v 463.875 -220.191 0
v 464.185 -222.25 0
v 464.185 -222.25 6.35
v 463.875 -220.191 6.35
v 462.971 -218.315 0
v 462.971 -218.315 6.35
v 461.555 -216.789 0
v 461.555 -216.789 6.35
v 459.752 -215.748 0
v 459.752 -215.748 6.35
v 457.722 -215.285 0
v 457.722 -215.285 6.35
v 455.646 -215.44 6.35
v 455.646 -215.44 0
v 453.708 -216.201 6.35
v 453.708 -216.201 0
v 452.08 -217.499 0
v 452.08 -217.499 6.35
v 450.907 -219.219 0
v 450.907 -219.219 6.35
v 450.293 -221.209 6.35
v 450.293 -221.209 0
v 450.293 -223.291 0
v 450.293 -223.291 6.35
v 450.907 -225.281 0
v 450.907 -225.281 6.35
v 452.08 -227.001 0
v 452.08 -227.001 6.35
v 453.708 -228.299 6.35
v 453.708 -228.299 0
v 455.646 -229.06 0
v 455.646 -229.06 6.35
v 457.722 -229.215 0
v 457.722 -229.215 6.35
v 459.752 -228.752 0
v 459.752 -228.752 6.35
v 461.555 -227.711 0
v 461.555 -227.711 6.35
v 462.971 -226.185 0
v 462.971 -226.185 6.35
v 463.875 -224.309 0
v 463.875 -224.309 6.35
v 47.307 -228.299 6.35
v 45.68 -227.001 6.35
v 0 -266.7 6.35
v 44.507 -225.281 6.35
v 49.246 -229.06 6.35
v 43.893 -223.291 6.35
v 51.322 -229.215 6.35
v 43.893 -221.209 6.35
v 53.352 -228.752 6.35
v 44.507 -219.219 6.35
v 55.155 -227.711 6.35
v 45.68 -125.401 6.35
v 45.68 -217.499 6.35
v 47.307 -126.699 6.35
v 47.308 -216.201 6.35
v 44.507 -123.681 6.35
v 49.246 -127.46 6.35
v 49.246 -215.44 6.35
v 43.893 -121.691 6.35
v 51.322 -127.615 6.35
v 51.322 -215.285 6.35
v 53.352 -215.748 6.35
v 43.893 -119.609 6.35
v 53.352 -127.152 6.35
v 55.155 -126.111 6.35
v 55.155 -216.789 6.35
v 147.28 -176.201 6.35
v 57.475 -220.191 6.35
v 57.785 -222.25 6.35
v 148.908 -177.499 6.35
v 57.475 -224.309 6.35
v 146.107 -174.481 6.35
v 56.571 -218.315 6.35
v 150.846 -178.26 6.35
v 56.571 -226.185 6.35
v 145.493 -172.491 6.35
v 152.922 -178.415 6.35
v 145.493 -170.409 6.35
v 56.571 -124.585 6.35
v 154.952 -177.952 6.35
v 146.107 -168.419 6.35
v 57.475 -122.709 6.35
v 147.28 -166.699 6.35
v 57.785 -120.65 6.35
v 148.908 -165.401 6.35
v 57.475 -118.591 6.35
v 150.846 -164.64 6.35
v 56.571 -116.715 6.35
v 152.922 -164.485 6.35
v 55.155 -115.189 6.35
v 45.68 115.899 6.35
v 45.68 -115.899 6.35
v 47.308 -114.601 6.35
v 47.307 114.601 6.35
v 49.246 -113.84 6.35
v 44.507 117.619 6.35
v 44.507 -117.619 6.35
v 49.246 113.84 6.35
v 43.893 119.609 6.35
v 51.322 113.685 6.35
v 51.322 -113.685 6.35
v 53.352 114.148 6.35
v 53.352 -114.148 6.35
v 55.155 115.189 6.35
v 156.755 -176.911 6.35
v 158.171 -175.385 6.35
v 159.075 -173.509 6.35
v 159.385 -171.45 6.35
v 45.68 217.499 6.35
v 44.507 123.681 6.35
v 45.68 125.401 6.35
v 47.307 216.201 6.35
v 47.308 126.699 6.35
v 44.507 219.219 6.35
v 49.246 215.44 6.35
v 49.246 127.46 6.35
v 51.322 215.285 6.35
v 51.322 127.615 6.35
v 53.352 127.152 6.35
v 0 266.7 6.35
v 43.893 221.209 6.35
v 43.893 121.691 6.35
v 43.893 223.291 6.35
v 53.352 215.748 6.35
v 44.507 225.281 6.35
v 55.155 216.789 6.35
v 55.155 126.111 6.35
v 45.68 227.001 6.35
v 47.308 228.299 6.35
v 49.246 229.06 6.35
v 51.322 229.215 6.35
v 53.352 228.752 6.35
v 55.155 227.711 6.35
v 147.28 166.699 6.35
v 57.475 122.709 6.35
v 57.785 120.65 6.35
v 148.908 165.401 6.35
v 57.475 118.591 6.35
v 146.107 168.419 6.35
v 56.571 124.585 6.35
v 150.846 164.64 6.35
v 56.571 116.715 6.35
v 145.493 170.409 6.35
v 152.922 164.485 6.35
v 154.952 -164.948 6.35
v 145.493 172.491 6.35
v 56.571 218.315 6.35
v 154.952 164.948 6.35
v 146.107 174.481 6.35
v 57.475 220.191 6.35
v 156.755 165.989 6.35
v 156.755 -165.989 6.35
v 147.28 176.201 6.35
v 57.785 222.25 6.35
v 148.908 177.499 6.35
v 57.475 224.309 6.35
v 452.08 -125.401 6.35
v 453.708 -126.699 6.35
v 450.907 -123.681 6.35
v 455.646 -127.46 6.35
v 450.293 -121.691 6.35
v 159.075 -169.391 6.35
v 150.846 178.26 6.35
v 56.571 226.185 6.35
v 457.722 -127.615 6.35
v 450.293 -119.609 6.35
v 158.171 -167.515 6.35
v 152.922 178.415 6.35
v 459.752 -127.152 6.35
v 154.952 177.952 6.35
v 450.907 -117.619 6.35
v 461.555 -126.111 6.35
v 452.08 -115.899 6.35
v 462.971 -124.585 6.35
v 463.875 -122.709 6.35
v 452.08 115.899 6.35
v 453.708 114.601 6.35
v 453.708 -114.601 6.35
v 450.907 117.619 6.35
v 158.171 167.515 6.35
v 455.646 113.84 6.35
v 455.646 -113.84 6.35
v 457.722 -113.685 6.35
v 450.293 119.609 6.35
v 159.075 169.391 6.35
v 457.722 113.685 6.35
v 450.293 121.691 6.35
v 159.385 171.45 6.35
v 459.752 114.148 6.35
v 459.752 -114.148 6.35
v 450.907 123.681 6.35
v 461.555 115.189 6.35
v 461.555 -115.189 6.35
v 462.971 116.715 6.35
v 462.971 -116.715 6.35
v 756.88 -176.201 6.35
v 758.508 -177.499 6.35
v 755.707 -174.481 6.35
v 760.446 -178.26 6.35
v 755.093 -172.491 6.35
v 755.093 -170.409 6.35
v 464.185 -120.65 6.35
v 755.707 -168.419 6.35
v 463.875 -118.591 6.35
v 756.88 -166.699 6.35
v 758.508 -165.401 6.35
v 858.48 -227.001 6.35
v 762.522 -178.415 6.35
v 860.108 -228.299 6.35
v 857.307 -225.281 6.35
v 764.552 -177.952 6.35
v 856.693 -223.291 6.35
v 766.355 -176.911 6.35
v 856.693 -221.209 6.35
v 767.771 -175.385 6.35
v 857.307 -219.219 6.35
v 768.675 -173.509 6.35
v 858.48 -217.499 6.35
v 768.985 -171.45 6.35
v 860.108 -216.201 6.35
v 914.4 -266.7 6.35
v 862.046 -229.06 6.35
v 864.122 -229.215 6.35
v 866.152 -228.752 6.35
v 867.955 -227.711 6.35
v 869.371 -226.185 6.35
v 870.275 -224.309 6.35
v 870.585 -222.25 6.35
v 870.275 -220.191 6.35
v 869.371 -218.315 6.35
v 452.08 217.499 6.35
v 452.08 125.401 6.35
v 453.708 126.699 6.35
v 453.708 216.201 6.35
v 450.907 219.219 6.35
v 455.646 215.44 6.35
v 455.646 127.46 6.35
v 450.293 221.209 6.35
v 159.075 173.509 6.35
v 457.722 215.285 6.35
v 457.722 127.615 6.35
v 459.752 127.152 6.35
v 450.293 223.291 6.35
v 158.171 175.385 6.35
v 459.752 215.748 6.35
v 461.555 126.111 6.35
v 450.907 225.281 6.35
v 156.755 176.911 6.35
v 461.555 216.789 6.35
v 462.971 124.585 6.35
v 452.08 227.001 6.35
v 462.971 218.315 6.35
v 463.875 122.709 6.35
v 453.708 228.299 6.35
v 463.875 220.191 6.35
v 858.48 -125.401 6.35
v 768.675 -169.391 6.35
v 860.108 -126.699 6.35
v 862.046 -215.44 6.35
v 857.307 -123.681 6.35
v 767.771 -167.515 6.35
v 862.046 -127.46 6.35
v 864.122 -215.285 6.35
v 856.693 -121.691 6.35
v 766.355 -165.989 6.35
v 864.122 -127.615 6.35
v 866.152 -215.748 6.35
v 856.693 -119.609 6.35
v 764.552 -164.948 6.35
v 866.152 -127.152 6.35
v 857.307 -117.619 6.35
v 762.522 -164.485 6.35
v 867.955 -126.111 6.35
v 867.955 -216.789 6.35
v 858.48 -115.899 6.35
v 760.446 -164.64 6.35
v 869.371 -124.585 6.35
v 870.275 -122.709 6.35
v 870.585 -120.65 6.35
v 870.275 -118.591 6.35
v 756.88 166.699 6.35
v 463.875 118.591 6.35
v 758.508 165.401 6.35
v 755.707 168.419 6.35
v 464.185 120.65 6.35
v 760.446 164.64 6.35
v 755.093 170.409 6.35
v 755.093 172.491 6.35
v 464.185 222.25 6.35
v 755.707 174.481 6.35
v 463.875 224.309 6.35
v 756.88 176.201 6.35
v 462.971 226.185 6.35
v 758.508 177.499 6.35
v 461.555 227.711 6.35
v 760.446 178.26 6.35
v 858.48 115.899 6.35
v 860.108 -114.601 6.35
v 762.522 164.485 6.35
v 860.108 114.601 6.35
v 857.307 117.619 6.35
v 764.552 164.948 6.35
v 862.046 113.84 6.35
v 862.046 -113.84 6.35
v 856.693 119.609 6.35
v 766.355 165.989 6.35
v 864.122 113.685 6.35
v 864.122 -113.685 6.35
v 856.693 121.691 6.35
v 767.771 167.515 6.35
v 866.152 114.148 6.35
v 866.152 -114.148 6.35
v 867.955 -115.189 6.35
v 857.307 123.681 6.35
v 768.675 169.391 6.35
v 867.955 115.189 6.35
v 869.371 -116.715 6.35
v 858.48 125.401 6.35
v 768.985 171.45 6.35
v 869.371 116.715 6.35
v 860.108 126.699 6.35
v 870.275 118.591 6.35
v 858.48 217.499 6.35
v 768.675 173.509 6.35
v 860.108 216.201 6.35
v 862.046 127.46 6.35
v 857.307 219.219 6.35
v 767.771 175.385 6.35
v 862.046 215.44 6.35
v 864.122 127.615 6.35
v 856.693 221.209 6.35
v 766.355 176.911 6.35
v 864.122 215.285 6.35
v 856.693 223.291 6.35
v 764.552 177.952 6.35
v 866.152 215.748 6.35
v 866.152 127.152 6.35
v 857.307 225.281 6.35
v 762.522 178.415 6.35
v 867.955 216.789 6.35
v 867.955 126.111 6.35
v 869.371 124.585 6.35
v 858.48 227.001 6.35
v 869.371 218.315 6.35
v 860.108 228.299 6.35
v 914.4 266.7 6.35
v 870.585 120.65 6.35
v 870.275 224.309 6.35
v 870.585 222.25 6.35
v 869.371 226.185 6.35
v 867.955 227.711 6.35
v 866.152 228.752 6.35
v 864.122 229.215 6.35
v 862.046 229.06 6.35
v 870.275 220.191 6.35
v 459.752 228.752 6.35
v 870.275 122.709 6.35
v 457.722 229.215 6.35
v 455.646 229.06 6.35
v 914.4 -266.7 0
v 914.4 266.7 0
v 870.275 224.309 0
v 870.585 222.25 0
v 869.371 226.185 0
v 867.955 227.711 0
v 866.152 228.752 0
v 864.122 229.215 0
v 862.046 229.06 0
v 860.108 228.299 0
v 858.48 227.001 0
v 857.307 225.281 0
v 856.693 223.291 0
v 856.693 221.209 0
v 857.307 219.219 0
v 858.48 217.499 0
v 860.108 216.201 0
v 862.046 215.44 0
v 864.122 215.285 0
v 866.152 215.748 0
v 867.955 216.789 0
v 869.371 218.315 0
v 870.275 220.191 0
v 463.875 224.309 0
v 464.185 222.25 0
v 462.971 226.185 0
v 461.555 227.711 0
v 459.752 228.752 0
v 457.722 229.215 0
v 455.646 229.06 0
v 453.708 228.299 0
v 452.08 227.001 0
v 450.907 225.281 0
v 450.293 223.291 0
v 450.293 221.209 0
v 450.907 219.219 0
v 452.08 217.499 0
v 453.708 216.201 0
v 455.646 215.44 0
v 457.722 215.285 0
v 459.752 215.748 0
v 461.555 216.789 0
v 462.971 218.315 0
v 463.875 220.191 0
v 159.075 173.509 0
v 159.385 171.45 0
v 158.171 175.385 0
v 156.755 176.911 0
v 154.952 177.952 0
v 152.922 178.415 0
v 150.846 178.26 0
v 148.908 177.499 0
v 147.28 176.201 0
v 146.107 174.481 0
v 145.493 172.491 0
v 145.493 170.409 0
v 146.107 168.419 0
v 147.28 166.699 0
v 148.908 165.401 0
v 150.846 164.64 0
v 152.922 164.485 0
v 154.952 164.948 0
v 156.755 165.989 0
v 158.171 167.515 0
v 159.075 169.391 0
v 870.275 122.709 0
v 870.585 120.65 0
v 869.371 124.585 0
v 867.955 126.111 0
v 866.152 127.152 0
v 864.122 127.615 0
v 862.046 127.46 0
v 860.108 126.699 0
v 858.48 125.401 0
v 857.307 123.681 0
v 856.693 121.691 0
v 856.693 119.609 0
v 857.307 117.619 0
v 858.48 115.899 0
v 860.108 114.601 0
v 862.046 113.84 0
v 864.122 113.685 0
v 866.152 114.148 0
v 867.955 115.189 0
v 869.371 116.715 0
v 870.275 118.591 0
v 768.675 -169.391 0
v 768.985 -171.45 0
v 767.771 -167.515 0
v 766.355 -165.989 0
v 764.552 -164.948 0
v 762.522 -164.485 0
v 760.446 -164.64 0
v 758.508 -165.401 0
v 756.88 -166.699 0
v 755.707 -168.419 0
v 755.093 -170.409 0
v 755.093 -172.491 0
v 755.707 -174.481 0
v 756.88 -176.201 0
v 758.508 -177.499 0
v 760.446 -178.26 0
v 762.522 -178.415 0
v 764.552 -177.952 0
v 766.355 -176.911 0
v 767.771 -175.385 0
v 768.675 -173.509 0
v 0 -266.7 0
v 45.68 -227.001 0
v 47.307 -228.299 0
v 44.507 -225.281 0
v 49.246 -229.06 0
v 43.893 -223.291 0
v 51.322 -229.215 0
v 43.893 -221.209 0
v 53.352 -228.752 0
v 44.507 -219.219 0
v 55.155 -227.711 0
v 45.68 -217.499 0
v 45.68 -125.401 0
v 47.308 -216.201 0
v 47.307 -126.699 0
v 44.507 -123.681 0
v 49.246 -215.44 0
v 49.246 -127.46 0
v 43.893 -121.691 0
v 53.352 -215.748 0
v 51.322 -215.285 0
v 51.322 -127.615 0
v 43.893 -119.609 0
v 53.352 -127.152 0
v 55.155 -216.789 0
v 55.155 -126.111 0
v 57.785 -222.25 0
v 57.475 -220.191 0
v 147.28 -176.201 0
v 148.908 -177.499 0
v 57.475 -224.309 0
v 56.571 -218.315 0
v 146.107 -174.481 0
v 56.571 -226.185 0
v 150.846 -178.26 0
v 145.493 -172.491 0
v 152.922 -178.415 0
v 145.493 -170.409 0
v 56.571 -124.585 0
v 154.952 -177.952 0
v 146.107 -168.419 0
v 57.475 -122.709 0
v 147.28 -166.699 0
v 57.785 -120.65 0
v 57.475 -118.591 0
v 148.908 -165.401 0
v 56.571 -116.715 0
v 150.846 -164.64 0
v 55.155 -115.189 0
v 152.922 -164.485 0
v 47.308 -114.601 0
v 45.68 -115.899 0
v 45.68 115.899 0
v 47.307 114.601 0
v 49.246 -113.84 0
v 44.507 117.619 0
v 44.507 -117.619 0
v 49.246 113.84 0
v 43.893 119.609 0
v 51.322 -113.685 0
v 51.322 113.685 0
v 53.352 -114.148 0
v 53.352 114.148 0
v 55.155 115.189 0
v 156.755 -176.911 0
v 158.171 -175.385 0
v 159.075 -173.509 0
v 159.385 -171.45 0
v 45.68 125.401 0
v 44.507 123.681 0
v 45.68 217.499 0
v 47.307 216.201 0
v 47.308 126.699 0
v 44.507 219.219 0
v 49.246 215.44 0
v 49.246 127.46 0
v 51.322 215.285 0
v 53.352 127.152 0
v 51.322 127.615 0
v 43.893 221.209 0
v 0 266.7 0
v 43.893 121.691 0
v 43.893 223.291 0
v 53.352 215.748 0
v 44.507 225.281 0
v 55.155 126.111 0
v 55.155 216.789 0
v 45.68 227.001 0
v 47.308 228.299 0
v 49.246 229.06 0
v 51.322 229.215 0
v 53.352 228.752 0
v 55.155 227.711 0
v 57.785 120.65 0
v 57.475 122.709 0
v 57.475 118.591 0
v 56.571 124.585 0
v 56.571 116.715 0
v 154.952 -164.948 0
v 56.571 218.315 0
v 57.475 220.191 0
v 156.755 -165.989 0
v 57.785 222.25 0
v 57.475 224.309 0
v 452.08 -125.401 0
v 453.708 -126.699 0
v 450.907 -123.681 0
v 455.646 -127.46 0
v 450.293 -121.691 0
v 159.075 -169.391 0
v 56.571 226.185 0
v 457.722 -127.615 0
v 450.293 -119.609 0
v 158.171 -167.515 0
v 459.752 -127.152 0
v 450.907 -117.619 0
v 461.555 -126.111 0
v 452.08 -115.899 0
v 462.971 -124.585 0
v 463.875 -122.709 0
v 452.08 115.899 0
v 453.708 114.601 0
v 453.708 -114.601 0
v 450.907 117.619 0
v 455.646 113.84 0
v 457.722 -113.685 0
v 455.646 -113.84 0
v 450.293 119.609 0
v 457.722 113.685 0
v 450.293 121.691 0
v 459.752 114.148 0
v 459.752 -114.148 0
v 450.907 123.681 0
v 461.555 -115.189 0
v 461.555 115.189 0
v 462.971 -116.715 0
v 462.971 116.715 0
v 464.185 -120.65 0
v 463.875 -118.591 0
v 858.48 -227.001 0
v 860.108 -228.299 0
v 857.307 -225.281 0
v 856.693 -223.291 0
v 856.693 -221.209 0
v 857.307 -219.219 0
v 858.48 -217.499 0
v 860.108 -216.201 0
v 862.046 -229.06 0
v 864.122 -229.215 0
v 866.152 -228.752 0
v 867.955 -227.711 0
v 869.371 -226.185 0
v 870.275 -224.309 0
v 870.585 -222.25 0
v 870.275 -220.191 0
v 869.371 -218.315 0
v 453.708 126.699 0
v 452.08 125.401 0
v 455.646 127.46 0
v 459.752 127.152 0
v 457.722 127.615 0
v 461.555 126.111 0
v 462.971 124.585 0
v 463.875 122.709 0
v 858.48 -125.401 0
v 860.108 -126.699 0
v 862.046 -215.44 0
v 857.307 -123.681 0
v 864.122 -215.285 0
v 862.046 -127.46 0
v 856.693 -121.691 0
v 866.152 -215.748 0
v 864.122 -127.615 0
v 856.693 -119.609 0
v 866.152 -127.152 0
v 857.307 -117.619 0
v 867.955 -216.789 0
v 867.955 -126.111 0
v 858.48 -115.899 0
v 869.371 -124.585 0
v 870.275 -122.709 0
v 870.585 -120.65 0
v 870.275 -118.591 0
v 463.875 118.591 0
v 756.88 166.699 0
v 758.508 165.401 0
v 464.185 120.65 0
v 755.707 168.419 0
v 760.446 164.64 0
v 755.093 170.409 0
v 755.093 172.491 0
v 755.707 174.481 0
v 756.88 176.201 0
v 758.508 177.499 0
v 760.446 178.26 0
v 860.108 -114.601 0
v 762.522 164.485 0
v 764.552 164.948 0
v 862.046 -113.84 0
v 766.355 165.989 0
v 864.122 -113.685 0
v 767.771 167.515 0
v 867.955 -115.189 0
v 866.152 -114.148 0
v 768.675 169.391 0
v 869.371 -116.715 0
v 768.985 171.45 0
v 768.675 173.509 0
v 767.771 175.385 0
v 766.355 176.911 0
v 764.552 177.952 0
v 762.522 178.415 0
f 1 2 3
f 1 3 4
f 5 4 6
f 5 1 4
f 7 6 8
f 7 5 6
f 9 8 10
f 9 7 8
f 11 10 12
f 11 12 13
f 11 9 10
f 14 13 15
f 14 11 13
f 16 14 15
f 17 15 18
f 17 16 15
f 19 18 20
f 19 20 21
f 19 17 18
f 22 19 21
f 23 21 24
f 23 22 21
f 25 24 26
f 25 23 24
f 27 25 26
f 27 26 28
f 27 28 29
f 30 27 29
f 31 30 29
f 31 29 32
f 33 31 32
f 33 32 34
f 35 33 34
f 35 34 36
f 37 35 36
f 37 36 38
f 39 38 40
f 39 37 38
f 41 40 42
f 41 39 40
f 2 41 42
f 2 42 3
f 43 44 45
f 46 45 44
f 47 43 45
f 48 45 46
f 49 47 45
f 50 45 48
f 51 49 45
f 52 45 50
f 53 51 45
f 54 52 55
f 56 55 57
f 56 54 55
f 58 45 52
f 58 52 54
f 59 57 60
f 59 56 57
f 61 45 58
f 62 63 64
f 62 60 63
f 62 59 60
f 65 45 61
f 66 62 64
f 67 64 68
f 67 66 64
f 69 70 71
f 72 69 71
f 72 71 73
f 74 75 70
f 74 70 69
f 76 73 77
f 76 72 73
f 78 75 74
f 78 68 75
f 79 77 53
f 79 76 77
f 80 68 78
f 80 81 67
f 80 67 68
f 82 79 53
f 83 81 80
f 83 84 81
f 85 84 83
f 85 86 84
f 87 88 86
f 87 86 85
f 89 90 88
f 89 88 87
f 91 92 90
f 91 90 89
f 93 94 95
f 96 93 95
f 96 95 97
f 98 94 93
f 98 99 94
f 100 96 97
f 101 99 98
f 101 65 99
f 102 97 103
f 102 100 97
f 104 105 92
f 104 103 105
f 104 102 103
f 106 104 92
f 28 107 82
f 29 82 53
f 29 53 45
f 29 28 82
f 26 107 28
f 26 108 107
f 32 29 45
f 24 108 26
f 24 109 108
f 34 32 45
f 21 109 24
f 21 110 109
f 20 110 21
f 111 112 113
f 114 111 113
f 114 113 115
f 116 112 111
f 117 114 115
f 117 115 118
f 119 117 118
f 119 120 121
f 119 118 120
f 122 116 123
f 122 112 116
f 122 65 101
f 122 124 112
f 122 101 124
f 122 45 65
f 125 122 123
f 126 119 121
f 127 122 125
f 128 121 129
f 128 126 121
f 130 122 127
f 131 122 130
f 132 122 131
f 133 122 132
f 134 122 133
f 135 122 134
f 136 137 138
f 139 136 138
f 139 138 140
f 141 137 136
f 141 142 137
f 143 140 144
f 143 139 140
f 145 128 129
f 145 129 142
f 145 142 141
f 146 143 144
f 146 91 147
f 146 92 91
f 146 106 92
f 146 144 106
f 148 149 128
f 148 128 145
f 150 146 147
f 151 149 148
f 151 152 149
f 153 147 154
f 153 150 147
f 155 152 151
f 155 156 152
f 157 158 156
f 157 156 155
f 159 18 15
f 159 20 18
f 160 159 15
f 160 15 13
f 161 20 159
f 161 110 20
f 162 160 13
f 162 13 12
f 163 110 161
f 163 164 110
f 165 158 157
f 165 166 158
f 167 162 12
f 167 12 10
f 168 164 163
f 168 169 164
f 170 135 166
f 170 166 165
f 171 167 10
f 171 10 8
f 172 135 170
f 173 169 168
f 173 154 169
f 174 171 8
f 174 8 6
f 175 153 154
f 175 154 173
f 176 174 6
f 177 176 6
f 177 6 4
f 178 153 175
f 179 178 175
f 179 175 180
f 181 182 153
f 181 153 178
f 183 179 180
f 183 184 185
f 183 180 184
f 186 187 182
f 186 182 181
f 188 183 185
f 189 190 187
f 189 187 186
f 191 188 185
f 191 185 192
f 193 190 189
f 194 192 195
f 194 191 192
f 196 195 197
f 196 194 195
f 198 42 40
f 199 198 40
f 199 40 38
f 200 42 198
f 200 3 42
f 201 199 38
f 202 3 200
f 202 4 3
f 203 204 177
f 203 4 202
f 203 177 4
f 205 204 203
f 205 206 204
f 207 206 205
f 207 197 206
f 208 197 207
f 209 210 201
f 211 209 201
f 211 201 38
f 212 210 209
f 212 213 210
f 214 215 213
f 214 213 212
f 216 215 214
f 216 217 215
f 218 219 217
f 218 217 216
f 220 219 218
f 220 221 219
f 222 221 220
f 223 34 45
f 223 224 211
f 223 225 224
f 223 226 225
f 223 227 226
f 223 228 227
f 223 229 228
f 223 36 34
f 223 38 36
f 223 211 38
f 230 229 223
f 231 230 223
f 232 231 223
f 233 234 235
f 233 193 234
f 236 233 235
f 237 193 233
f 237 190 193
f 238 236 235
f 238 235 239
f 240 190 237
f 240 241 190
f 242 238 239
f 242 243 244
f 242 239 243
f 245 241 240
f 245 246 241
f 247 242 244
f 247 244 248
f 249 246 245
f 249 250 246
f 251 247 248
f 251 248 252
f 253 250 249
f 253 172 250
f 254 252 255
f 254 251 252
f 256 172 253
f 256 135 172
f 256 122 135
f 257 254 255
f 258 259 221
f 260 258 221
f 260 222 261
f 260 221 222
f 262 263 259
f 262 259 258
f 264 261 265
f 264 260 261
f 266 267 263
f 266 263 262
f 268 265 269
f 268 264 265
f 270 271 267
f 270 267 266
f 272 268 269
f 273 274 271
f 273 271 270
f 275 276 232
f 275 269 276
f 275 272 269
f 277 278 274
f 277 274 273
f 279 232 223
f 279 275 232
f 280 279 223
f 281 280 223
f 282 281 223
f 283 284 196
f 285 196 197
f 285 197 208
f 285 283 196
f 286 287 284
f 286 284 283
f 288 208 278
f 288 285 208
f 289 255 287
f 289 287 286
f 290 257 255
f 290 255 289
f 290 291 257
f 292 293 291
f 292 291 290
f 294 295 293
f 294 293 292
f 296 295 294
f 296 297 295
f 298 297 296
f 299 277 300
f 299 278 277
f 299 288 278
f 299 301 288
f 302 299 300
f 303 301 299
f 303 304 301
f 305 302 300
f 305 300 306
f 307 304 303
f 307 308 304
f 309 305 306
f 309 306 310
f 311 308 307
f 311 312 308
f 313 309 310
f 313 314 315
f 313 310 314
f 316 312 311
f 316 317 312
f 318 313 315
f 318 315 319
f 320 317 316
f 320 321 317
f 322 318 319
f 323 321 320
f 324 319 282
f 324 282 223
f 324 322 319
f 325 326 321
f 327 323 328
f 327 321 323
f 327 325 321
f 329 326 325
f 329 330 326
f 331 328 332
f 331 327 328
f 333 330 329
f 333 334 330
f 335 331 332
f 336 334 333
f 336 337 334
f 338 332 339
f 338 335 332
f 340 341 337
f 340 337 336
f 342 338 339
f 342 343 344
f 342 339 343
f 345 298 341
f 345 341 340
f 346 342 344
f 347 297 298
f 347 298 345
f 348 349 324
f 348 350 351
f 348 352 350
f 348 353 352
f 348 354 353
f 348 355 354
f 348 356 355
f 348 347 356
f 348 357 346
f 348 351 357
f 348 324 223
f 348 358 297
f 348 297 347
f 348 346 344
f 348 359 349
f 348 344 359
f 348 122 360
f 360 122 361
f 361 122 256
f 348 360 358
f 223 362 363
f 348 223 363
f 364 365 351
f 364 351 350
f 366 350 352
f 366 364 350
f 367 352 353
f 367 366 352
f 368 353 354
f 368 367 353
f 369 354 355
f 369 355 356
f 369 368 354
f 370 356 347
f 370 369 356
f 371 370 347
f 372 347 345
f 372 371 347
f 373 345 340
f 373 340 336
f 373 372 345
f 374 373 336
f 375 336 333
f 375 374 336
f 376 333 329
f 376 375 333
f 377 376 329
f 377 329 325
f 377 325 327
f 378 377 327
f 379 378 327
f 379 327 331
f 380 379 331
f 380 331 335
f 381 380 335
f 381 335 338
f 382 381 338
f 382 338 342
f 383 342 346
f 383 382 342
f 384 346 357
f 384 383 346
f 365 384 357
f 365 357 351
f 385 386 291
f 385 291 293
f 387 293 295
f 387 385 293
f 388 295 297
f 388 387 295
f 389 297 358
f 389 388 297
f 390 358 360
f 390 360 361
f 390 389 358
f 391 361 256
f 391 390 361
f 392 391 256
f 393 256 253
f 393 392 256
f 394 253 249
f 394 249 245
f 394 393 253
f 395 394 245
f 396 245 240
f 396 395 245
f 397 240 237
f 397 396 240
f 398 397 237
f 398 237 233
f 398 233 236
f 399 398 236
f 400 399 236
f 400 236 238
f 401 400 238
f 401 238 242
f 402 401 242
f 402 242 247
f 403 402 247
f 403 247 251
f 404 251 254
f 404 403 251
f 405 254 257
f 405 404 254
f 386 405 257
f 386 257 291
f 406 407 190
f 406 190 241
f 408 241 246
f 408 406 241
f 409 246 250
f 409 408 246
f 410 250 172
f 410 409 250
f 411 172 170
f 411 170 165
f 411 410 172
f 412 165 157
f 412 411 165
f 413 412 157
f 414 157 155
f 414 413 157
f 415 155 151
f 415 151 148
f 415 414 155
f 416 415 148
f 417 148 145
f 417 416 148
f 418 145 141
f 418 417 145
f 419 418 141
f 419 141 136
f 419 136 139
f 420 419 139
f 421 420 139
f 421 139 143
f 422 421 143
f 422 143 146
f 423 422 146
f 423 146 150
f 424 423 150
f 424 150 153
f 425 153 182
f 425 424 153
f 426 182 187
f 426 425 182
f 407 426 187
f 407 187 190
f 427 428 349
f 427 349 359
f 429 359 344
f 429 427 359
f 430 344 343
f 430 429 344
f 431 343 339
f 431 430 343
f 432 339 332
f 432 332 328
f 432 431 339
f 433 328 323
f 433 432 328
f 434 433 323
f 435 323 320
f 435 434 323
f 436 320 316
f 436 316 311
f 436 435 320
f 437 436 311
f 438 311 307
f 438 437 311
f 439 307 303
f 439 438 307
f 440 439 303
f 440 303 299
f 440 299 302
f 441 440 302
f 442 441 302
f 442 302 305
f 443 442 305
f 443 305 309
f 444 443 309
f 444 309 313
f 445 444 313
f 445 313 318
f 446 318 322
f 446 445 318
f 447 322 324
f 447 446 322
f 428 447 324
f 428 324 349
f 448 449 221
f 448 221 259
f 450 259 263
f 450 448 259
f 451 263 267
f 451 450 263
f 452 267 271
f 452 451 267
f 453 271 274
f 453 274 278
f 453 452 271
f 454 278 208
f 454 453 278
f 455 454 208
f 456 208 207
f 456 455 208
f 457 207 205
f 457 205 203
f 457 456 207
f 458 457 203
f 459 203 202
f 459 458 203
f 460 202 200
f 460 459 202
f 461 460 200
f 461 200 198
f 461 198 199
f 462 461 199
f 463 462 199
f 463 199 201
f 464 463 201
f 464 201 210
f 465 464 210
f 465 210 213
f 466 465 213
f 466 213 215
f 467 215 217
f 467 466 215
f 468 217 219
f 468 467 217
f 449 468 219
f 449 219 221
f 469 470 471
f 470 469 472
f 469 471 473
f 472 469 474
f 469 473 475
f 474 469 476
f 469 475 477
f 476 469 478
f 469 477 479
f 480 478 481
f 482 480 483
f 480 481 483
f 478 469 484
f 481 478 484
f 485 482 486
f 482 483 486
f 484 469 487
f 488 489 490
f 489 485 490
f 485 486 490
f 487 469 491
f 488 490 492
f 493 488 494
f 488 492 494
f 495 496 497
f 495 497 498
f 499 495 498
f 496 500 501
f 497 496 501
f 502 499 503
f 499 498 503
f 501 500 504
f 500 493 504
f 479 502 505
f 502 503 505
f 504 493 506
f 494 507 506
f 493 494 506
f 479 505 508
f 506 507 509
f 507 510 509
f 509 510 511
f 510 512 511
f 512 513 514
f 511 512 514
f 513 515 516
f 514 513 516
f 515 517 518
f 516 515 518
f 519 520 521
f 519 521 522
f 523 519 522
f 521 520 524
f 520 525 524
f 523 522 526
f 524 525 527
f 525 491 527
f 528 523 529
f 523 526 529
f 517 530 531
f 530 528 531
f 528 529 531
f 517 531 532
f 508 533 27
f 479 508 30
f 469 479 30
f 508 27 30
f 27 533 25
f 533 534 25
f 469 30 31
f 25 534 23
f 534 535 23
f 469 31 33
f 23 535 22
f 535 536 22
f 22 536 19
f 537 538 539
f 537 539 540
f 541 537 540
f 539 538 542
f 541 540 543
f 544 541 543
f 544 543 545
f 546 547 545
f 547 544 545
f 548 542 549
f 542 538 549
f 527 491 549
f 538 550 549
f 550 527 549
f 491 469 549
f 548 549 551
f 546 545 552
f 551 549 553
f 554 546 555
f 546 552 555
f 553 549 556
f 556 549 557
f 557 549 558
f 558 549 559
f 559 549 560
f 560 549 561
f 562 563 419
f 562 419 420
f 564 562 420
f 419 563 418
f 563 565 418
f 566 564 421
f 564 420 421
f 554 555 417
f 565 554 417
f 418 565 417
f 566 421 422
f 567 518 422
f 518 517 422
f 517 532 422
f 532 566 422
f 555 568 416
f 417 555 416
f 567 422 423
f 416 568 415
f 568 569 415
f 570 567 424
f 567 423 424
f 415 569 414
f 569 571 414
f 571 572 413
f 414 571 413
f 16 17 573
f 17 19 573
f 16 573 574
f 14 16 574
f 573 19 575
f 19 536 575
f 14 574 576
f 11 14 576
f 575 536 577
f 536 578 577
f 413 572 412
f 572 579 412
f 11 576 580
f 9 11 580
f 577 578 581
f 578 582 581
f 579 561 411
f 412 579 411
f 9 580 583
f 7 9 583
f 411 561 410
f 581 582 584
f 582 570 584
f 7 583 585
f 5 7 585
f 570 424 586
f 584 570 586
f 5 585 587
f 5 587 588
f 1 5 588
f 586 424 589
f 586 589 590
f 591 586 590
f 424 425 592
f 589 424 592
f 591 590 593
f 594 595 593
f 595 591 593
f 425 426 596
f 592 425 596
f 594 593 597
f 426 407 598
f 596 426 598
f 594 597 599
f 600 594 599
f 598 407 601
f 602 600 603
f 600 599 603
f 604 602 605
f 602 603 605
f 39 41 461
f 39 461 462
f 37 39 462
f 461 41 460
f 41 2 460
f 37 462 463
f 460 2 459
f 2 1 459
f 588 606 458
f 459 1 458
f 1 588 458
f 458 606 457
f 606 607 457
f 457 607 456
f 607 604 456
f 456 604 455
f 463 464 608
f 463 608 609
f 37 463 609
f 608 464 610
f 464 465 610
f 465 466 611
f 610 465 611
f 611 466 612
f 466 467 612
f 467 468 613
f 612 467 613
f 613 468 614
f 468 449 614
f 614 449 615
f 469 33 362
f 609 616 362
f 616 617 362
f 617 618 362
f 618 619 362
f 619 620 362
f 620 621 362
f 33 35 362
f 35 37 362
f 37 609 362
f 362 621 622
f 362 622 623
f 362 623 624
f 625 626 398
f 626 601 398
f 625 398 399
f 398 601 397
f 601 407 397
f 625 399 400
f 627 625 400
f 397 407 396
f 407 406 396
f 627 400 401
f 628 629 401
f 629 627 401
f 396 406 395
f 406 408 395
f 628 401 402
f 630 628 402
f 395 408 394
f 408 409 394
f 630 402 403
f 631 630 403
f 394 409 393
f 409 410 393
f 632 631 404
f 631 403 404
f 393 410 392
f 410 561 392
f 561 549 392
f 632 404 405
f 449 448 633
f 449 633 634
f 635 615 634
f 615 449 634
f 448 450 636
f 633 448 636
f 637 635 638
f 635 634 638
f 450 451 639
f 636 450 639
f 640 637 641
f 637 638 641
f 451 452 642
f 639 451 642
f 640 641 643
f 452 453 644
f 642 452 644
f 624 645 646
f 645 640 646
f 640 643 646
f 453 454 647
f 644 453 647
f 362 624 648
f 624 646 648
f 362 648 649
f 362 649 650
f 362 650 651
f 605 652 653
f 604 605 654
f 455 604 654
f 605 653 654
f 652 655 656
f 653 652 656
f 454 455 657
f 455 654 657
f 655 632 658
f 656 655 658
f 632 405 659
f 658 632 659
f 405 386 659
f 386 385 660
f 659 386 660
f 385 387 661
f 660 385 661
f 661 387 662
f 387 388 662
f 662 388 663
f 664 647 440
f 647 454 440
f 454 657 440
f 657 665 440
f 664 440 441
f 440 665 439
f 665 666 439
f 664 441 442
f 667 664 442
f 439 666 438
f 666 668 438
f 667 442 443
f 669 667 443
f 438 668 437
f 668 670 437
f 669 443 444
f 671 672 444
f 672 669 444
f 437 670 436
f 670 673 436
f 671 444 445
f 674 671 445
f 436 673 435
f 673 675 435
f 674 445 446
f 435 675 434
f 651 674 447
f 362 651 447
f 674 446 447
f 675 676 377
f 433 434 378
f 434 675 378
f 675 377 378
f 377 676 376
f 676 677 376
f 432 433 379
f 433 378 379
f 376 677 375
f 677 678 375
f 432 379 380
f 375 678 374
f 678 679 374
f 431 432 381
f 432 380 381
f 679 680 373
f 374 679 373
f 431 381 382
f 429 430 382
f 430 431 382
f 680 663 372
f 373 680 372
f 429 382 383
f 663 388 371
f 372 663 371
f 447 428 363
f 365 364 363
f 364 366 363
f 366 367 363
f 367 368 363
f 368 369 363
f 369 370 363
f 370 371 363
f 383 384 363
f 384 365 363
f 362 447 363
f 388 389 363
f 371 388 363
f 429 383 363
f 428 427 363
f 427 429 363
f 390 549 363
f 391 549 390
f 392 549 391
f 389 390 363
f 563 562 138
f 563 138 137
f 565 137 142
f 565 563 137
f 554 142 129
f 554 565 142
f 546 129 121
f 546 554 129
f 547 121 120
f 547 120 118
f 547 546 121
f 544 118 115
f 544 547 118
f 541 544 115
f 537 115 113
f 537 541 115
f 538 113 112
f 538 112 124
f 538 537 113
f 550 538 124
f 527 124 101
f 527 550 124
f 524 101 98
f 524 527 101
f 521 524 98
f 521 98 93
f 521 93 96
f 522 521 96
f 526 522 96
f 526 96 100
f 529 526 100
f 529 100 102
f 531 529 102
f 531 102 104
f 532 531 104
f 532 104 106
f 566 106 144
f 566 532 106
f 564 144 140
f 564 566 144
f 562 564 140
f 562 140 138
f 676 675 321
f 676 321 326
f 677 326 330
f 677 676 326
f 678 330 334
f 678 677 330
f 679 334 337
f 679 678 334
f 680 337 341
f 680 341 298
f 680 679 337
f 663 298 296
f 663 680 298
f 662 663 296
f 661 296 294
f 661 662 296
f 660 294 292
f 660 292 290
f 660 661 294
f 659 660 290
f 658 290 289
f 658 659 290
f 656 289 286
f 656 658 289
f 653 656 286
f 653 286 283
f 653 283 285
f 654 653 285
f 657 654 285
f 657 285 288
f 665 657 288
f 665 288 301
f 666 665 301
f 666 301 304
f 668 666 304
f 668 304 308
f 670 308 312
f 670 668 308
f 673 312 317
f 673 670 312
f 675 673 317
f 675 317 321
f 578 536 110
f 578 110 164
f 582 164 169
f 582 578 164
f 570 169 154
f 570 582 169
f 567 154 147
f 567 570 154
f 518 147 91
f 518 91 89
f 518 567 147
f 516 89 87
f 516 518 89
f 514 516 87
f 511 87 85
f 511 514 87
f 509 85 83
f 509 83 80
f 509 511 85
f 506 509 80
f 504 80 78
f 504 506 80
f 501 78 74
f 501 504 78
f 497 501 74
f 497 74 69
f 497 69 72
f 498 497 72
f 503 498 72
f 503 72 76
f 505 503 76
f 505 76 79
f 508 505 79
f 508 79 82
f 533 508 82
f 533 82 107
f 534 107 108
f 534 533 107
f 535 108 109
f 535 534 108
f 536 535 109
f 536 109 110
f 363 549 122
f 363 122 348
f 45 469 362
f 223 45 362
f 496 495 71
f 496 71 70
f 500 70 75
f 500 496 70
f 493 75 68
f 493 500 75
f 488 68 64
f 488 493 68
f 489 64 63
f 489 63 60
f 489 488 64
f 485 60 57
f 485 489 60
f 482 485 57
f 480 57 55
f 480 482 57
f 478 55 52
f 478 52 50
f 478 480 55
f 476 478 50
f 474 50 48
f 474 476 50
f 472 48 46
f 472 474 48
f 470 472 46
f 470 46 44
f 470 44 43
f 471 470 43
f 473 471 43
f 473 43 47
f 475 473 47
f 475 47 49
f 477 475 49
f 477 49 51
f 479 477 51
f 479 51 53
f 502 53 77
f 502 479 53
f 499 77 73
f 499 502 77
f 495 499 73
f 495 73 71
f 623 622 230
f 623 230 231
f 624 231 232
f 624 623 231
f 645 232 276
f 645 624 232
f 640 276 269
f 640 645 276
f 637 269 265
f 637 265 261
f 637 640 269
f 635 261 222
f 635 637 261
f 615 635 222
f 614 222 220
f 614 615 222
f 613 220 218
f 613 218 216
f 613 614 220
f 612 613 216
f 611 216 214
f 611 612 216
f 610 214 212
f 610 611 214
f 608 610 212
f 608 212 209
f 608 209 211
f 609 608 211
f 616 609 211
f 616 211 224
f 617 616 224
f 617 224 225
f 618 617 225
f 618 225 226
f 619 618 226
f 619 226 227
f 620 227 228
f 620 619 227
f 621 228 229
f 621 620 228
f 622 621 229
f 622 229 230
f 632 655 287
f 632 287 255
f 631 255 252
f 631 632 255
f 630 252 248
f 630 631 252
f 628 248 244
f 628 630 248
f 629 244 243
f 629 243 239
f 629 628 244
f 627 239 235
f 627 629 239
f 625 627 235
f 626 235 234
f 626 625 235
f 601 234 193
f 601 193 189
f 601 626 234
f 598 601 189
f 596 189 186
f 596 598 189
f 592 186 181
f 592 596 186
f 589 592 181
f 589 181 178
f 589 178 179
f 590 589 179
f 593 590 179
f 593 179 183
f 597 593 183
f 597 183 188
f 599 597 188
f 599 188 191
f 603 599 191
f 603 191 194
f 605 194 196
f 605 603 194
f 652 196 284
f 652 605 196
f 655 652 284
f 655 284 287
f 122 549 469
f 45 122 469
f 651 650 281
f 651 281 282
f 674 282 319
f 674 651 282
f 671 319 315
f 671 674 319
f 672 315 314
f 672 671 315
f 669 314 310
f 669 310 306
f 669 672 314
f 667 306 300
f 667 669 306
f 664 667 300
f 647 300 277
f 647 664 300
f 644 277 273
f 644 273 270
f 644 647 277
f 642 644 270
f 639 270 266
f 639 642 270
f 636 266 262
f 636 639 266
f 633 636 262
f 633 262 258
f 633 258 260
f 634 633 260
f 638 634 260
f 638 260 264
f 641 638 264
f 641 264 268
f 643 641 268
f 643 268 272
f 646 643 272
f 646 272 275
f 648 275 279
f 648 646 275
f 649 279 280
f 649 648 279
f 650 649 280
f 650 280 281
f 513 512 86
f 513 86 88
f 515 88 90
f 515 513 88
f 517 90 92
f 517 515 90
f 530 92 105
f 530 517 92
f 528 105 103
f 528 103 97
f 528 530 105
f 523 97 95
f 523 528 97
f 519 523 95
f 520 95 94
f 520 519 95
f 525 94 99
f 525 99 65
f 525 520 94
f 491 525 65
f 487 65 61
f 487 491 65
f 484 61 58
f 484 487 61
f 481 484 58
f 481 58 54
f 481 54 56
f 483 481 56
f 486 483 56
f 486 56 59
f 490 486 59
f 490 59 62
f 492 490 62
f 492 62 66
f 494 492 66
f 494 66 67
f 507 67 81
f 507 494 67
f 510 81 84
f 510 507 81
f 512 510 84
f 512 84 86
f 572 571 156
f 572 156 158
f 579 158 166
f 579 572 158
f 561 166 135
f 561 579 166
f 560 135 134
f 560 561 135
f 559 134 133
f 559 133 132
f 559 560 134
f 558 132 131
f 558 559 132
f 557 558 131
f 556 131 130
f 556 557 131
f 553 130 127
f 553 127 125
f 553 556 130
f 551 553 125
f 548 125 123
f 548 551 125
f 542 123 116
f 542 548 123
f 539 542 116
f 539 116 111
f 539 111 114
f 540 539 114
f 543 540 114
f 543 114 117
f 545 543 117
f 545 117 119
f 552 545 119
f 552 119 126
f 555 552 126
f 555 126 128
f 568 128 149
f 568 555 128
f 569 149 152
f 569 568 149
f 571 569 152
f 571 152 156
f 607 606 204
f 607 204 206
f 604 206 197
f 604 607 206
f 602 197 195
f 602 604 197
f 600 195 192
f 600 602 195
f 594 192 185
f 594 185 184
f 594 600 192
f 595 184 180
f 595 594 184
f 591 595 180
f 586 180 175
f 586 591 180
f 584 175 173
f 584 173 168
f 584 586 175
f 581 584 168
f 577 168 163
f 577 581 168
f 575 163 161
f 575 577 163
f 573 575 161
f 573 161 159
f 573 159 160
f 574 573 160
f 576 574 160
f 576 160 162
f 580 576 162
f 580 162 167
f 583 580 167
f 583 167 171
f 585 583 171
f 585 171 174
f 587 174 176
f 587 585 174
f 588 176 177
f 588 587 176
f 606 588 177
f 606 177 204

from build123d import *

# Parameters (mm, degrees)
F0_W     = 914.4
F0_H     = 184.15
F0_R     = 6.985
F0_H_2   = 165.1
F1_DEPTH = 6.35


with BuildPart() as f1:
    # F0 (on Top) → F1 (new body)
    with BuildSketch(Plane.XY):
        with Locations((457.2, 174.625)):
            Rectangle(F0_W, F0_H)
        with Locations((50.8, 120.65)):
            Circle(F0_R, mode=Mode.SUBTRACT)
        with Locations((152.4, 171.45)):
            Circle(F0_R, mode=Mode.SUBTRACT)
        with Locations((50.8, 222.25)):
            Circle(F0_R, mode=Mode.SUBTRACT)
        with Locations((457.2, 120.65)):
            Circle(F0_R, mode=Mode.SUBTRACT)
        with Locations((863.6, 120.65)):
            Circle(F0_R, mode=Mode.SUBTRACT)
        with Locations((457.2, 222.25)):
            Circle(F0_R, mode=Mode.SUBTRACT)
        with Locations((762, 171.45)):
            Circle(F0_R, mode=Mode.SUBTRACT)
        with Locations((863.6, 222.25)):
            Circle(F0_R, mode=Mode.SUBTRACT)
        with Locations((457.2, 0)):
            Rectangle(F0_W, F0_H_2)
        with Locations((457.2, -174.625)):
            Rectangle(F0_W, F0_H)
        with Locations((50.8, -222.25)):
            Circle(F0_R, mode=Mode.SUBTRACT)
        with Locations((152.4, -171.45)):
            Circle(F0_R, mode=Mode.SUBTRACT)
        with Locations((50.8, -120.65)):
            Circle(F0_R, mode=Mode.SUBTRACT)
        with Locations((457.2, -222.25)):
            Circle(F0_R, mode=Mode.SUBTRACT)
        with Locations((863.6, -222.25)):
            Circle(F0_R, mode=Mode.SUBTRACT)
        with Locations((762, -171.45)):
            Circle(F0_R, mode=Mode.SUBTRACT)
        with Locations((457.2, -120.65)):
            Circle(F0_R, mode=Mode.SUBTRACT)
        with Locations((863.6, -120.65)):
            Circle(F0_R, mode=Mode.SUBTRACT)
    extrude(amount=F1_DEPTH)


solid = f1.part
